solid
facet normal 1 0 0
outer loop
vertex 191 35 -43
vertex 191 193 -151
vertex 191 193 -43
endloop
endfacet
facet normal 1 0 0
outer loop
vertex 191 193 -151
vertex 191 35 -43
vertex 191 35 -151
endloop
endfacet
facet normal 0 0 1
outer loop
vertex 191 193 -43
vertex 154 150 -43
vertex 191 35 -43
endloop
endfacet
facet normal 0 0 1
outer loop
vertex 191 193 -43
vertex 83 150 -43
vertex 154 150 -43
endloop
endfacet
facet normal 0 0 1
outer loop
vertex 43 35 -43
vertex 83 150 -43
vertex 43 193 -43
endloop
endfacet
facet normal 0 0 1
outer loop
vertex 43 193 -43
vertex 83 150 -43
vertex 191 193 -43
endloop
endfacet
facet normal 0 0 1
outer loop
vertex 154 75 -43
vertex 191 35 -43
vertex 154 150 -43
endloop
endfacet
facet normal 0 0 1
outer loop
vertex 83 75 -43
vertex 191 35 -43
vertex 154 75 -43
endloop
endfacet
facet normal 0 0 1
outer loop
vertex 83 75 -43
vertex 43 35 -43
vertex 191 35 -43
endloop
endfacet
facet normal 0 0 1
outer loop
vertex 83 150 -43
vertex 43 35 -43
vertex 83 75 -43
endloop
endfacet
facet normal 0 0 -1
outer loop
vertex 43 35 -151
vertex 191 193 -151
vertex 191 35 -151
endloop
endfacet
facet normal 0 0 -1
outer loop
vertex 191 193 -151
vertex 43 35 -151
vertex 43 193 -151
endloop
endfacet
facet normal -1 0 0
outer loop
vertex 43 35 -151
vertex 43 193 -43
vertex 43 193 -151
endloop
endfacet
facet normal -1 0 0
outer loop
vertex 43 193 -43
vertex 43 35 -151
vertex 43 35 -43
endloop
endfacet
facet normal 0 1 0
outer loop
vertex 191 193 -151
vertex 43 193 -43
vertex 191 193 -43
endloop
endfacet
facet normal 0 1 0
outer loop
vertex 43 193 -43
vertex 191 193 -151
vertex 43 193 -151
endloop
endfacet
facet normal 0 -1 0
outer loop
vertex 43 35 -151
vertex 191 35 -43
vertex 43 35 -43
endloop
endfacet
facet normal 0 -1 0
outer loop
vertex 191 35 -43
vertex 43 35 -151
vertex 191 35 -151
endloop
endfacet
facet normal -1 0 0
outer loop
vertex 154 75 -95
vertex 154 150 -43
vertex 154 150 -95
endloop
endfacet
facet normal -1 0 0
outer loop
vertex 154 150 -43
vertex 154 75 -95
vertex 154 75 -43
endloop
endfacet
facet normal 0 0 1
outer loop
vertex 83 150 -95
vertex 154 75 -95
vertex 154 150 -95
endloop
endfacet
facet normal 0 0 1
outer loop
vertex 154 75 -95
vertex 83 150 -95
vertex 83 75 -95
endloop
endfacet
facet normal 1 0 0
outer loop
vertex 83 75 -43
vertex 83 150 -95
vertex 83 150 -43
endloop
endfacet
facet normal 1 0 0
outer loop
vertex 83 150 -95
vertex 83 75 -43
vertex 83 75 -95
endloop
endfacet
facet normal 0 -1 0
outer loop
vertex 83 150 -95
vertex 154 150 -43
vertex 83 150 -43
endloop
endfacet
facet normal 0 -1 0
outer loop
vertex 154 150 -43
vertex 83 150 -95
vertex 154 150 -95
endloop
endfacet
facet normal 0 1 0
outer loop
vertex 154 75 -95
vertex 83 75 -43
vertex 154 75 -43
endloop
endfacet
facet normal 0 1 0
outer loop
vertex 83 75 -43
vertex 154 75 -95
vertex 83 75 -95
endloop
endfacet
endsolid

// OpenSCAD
difference(){
    union(){
        cube(size=[0, 0, 0]);
        translate(v=[117.0, 114.0, -97.0]){
            translate(v=[-74.0, -79.0, -54.0]){
                cube(size=[148.0, 158.0, 108.0]);
            };
        };
    };
    translate(v=[118.5, 112.5, -69.0]){
        translate(v=[-35.5, -37.5, -26.0]){
            cube(size=[71.0, 75.0, 52.0]);
        };
    };
};
